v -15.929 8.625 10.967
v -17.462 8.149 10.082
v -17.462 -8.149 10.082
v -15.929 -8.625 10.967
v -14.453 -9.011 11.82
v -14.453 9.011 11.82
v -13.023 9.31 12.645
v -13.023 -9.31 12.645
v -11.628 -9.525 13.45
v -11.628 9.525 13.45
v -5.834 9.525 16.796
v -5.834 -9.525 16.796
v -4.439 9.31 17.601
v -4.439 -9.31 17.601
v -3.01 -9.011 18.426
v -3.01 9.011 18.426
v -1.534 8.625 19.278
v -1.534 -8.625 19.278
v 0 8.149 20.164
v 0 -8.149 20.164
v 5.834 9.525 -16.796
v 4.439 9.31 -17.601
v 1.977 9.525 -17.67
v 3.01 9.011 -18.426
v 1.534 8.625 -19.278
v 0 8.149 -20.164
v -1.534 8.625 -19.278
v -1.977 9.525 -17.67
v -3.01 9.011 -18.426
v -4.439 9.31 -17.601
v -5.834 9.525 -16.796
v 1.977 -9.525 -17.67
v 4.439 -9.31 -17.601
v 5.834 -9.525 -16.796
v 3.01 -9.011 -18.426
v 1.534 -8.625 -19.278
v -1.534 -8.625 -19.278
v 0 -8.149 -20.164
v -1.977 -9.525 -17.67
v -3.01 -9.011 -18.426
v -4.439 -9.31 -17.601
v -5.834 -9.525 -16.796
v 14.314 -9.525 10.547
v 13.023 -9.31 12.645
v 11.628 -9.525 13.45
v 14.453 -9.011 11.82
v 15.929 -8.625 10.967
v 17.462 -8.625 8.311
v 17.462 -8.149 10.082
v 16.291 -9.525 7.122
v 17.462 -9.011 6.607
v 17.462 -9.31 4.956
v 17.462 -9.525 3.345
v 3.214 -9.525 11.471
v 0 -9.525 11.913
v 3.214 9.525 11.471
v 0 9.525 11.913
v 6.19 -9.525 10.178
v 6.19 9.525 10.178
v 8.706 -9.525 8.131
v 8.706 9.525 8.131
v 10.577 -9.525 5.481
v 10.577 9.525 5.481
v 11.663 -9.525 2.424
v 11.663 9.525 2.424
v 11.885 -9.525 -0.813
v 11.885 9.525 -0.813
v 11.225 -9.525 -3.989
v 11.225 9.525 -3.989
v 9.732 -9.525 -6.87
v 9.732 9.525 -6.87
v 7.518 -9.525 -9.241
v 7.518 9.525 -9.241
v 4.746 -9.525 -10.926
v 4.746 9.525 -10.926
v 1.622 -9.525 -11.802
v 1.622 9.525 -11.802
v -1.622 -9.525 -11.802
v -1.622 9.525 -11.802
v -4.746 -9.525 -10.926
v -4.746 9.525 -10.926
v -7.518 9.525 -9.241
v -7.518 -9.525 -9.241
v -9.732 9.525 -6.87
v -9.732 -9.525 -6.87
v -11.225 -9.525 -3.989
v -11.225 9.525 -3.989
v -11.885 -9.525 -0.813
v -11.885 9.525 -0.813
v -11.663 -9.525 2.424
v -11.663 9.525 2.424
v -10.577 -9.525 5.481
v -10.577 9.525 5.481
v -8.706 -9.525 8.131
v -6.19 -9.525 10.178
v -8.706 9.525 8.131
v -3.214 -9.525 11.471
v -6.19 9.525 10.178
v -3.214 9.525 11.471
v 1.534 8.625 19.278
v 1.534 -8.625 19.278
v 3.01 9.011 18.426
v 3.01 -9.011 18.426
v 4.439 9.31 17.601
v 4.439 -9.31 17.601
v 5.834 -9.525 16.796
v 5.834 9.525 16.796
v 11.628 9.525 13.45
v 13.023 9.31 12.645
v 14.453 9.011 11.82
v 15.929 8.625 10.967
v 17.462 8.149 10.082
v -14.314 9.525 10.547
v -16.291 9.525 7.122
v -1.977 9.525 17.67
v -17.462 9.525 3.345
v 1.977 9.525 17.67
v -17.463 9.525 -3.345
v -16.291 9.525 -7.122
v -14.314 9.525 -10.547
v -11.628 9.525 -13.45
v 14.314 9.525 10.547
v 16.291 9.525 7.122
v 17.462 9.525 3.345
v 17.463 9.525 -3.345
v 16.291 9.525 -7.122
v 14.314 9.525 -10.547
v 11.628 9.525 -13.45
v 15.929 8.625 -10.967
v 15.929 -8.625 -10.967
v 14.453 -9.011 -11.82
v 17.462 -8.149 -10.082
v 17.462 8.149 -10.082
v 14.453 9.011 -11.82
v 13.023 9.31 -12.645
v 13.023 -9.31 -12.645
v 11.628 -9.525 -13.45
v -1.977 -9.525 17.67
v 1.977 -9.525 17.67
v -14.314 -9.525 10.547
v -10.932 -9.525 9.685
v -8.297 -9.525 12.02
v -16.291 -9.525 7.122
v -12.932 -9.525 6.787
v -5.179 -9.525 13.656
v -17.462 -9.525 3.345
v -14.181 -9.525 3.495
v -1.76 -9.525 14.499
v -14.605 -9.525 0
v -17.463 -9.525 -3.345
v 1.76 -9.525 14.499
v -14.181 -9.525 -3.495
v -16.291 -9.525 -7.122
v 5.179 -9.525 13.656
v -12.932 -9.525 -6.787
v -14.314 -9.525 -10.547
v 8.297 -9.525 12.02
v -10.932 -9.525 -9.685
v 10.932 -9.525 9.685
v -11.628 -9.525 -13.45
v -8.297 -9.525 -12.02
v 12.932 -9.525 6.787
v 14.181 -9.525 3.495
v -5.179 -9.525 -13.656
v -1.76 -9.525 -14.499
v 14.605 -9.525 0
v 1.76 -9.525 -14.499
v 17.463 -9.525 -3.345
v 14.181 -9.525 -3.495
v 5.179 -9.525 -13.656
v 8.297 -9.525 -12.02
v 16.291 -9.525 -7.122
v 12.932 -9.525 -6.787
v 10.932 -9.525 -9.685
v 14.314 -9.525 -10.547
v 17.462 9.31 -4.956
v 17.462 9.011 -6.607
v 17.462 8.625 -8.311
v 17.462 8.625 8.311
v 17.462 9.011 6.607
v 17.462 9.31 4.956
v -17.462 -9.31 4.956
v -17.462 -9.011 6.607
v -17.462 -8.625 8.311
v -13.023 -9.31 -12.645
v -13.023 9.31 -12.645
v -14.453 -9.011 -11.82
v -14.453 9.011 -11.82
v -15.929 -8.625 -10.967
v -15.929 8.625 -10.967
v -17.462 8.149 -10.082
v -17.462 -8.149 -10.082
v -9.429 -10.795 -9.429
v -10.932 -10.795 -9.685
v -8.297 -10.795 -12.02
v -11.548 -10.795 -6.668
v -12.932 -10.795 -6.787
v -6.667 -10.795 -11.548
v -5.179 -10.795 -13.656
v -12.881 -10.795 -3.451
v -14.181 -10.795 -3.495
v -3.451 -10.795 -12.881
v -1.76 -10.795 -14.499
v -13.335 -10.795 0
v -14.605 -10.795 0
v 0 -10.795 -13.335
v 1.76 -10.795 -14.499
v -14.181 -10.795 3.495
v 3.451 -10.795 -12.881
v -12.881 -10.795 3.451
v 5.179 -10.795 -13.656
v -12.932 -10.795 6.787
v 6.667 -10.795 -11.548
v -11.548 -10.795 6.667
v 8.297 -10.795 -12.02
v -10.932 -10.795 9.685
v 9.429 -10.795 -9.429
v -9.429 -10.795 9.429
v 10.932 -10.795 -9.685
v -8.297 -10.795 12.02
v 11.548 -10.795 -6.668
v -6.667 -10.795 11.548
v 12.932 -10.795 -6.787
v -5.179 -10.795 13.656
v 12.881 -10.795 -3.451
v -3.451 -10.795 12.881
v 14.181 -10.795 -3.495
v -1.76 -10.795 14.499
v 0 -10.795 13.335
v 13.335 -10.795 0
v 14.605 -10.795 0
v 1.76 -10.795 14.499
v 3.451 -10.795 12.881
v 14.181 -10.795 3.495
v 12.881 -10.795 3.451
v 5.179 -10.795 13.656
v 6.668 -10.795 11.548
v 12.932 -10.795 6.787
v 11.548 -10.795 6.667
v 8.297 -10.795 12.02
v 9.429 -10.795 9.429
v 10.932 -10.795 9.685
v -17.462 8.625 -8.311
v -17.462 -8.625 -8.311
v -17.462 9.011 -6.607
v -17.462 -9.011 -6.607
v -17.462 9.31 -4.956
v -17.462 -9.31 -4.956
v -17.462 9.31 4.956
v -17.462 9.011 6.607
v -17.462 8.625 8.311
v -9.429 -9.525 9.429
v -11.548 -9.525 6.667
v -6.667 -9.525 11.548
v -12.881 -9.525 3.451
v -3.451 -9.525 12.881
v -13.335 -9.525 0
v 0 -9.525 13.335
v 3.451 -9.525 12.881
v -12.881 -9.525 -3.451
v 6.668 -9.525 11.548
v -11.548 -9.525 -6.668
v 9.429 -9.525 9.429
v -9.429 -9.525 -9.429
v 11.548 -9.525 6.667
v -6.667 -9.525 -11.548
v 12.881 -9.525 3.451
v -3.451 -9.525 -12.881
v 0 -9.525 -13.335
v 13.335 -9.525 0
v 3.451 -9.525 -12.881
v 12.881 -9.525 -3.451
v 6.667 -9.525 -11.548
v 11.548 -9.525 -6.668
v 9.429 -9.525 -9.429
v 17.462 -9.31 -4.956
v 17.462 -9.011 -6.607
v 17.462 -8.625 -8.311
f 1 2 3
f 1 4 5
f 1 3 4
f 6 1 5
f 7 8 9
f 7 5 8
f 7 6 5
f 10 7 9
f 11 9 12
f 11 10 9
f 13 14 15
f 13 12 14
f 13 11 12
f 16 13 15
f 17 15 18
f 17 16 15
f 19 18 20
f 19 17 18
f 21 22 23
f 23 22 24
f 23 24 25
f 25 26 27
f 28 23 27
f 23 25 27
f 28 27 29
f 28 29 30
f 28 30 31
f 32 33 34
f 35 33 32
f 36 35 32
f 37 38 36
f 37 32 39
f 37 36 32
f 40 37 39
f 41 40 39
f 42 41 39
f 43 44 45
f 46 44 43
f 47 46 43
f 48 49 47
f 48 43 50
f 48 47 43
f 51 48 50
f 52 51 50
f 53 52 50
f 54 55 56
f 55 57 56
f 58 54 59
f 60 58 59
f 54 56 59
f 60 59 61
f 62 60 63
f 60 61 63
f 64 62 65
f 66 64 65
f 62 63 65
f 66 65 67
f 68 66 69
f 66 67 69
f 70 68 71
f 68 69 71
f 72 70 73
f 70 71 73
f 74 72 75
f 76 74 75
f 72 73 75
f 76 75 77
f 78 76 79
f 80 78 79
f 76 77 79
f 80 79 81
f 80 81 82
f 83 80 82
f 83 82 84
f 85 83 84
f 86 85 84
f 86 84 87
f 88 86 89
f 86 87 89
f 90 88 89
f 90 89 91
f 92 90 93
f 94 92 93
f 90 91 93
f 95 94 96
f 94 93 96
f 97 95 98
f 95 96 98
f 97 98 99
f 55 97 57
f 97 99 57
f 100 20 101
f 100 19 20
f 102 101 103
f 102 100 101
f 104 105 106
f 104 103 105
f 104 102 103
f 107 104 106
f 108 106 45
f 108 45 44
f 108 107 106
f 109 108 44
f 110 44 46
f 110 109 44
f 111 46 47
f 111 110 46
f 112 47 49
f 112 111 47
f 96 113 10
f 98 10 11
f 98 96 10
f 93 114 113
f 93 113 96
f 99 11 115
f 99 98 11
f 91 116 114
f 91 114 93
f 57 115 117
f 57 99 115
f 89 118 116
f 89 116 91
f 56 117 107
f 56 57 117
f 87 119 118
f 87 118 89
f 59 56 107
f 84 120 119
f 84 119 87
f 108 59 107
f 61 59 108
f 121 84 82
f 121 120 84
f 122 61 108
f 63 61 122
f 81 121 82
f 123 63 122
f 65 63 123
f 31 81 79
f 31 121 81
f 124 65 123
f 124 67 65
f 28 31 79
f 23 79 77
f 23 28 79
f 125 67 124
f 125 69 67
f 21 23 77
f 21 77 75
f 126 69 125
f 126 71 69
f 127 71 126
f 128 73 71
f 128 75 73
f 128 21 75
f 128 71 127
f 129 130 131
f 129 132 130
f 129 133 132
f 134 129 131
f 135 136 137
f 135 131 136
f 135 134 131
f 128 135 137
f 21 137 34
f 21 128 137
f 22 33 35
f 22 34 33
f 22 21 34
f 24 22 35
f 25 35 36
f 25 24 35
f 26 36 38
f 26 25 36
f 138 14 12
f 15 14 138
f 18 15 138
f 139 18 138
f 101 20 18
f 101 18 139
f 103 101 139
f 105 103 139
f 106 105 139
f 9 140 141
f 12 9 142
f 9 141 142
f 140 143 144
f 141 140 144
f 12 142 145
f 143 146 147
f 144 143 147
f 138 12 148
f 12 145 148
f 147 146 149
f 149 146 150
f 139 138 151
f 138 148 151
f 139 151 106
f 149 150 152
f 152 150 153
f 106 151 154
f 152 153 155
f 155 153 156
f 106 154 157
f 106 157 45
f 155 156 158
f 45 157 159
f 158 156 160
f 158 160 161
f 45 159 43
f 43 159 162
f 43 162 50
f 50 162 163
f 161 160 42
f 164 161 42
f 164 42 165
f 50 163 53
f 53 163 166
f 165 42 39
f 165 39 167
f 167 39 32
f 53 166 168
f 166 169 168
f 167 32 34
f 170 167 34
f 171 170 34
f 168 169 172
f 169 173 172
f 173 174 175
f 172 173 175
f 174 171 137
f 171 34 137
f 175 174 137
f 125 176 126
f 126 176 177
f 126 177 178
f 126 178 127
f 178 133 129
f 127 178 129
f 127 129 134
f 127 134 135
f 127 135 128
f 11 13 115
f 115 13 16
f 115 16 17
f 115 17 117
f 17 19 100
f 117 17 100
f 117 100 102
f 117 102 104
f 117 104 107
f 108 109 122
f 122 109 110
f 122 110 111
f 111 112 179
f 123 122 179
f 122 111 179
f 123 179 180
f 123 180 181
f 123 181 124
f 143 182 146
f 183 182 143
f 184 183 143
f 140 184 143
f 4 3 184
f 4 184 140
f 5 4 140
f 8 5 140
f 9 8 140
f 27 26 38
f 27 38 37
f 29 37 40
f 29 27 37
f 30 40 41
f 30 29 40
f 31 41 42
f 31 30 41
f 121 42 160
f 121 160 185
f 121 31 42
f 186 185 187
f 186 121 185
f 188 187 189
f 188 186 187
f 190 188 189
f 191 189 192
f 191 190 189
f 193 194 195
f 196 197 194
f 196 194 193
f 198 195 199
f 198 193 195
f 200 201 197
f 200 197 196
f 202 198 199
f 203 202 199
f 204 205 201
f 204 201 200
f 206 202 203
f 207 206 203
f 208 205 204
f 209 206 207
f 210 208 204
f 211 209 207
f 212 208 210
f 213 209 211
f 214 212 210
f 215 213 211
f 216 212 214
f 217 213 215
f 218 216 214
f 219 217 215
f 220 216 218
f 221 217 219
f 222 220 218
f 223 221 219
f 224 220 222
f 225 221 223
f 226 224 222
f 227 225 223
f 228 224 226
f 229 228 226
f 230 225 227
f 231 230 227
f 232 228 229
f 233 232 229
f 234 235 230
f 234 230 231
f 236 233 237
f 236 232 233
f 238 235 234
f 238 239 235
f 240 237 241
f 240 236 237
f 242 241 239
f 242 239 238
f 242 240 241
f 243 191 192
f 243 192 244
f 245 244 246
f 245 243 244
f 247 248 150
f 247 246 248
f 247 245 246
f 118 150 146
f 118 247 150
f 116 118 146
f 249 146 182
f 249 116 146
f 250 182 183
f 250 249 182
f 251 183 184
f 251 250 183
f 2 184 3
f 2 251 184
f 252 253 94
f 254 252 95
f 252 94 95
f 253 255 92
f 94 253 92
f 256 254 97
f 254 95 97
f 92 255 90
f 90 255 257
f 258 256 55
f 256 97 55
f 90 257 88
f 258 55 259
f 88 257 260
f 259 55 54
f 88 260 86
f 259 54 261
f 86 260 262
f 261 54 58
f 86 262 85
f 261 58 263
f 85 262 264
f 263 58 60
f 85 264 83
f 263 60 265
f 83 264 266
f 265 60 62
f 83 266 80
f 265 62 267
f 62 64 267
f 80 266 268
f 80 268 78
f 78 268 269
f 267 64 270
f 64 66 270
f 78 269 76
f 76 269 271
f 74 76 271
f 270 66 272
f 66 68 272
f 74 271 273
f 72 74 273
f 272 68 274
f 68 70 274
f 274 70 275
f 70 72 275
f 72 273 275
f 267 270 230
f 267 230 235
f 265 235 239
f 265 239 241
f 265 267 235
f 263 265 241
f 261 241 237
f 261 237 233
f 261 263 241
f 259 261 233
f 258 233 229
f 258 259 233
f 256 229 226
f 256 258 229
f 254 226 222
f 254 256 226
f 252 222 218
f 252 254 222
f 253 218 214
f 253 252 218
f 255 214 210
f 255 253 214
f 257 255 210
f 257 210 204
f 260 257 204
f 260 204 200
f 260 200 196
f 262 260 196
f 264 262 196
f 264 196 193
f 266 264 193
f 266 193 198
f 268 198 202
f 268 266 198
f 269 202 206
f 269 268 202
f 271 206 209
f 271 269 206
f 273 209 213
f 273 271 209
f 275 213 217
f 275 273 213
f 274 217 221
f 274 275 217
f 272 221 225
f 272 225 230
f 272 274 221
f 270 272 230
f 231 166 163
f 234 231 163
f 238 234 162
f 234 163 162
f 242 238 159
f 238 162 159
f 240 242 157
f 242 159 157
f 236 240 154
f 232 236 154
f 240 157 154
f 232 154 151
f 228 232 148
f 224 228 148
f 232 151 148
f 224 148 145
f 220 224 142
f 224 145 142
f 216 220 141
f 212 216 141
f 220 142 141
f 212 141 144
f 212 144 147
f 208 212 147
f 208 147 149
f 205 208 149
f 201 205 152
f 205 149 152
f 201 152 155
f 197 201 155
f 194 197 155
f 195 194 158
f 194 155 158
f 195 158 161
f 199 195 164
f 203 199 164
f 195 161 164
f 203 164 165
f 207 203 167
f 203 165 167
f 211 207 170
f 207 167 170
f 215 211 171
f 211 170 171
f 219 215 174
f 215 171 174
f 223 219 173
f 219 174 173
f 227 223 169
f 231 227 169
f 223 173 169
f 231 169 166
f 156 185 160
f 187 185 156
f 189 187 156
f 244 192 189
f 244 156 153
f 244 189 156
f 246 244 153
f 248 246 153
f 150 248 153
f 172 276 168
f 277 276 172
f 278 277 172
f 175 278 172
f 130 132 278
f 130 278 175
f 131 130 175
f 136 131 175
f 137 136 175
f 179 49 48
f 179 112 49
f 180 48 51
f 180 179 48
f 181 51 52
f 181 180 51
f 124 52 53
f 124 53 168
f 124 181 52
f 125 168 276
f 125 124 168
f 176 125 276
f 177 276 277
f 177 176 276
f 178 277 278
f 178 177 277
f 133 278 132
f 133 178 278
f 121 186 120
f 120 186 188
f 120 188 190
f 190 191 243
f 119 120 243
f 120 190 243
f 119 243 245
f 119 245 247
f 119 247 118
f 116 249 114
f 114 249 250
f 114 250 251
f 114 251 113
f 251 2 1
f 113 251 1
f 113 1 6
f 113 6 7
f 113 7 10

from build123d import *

# Parameters (mm, degrees)
BOSS_EXTRUDE1_DEPTH = 9.525
SKETCH4_W           = 11.9126
SKETCH4_H           = 19.05
SKETCH9_R           = 14.605
SKETCH9_R_2         = 13.335
BOSS_EXTRUDE2_DEPTH = 1.27


with BuildPart() as part:
    # Sketch1 → Boss-Extrude1 (new body, symmetric)
    with BuildSketch(Plane(origin=(0, 0, 0), x_dir=(1, 0, 0), z_dir=(0, 1, 0))):
        Polygon((17.4625, 10.081979076), (0, 20.163958151), (-17.4625, 10.081979076), (-17.4625, -10.081979076), (0, -20.163958151), (17.4625, -10.081979076), align=None)
    extrude(amount=BOSS_EXTRUDE1_DEPTH, both=True)

    # Sketch4 → Cut-Revolve1 (revolve, cut)
    with BuildSketch(Plane(origin=(0, 0, 0), x_dir=(0, 0, -1), z_dir=(1, 0, 0))):
        with Locations((-5.9563, 0)):
            Rectangle(SKETCH4_W, SKETCH4_H)
        Polygon((-17.78, -9.525), (-20.163958151, -8.14862112), (-20.163958151, -9.525), align=None)
        Polygon((-20.163958151, 9.525), (-17.78, 9.525), (-20.163958151, 8.14862112), align=None)
    revolve(axis=Axis((0, -9.525, 0), (0, 1, 0)), mode=Mode.SUBTRACT)

    # Sketch9 → Boss-Extrude2 (add)
    with BuildSketch(Plane.XZ.offset(9.525)):
        Circle(SKETCH9_R)
        Circle(SKETCH9_R_2, mode=Mode.SUBTRACT)
    extrude(amount=BOSS_EXTRUDE2_DEPTH)


solid = part.part
